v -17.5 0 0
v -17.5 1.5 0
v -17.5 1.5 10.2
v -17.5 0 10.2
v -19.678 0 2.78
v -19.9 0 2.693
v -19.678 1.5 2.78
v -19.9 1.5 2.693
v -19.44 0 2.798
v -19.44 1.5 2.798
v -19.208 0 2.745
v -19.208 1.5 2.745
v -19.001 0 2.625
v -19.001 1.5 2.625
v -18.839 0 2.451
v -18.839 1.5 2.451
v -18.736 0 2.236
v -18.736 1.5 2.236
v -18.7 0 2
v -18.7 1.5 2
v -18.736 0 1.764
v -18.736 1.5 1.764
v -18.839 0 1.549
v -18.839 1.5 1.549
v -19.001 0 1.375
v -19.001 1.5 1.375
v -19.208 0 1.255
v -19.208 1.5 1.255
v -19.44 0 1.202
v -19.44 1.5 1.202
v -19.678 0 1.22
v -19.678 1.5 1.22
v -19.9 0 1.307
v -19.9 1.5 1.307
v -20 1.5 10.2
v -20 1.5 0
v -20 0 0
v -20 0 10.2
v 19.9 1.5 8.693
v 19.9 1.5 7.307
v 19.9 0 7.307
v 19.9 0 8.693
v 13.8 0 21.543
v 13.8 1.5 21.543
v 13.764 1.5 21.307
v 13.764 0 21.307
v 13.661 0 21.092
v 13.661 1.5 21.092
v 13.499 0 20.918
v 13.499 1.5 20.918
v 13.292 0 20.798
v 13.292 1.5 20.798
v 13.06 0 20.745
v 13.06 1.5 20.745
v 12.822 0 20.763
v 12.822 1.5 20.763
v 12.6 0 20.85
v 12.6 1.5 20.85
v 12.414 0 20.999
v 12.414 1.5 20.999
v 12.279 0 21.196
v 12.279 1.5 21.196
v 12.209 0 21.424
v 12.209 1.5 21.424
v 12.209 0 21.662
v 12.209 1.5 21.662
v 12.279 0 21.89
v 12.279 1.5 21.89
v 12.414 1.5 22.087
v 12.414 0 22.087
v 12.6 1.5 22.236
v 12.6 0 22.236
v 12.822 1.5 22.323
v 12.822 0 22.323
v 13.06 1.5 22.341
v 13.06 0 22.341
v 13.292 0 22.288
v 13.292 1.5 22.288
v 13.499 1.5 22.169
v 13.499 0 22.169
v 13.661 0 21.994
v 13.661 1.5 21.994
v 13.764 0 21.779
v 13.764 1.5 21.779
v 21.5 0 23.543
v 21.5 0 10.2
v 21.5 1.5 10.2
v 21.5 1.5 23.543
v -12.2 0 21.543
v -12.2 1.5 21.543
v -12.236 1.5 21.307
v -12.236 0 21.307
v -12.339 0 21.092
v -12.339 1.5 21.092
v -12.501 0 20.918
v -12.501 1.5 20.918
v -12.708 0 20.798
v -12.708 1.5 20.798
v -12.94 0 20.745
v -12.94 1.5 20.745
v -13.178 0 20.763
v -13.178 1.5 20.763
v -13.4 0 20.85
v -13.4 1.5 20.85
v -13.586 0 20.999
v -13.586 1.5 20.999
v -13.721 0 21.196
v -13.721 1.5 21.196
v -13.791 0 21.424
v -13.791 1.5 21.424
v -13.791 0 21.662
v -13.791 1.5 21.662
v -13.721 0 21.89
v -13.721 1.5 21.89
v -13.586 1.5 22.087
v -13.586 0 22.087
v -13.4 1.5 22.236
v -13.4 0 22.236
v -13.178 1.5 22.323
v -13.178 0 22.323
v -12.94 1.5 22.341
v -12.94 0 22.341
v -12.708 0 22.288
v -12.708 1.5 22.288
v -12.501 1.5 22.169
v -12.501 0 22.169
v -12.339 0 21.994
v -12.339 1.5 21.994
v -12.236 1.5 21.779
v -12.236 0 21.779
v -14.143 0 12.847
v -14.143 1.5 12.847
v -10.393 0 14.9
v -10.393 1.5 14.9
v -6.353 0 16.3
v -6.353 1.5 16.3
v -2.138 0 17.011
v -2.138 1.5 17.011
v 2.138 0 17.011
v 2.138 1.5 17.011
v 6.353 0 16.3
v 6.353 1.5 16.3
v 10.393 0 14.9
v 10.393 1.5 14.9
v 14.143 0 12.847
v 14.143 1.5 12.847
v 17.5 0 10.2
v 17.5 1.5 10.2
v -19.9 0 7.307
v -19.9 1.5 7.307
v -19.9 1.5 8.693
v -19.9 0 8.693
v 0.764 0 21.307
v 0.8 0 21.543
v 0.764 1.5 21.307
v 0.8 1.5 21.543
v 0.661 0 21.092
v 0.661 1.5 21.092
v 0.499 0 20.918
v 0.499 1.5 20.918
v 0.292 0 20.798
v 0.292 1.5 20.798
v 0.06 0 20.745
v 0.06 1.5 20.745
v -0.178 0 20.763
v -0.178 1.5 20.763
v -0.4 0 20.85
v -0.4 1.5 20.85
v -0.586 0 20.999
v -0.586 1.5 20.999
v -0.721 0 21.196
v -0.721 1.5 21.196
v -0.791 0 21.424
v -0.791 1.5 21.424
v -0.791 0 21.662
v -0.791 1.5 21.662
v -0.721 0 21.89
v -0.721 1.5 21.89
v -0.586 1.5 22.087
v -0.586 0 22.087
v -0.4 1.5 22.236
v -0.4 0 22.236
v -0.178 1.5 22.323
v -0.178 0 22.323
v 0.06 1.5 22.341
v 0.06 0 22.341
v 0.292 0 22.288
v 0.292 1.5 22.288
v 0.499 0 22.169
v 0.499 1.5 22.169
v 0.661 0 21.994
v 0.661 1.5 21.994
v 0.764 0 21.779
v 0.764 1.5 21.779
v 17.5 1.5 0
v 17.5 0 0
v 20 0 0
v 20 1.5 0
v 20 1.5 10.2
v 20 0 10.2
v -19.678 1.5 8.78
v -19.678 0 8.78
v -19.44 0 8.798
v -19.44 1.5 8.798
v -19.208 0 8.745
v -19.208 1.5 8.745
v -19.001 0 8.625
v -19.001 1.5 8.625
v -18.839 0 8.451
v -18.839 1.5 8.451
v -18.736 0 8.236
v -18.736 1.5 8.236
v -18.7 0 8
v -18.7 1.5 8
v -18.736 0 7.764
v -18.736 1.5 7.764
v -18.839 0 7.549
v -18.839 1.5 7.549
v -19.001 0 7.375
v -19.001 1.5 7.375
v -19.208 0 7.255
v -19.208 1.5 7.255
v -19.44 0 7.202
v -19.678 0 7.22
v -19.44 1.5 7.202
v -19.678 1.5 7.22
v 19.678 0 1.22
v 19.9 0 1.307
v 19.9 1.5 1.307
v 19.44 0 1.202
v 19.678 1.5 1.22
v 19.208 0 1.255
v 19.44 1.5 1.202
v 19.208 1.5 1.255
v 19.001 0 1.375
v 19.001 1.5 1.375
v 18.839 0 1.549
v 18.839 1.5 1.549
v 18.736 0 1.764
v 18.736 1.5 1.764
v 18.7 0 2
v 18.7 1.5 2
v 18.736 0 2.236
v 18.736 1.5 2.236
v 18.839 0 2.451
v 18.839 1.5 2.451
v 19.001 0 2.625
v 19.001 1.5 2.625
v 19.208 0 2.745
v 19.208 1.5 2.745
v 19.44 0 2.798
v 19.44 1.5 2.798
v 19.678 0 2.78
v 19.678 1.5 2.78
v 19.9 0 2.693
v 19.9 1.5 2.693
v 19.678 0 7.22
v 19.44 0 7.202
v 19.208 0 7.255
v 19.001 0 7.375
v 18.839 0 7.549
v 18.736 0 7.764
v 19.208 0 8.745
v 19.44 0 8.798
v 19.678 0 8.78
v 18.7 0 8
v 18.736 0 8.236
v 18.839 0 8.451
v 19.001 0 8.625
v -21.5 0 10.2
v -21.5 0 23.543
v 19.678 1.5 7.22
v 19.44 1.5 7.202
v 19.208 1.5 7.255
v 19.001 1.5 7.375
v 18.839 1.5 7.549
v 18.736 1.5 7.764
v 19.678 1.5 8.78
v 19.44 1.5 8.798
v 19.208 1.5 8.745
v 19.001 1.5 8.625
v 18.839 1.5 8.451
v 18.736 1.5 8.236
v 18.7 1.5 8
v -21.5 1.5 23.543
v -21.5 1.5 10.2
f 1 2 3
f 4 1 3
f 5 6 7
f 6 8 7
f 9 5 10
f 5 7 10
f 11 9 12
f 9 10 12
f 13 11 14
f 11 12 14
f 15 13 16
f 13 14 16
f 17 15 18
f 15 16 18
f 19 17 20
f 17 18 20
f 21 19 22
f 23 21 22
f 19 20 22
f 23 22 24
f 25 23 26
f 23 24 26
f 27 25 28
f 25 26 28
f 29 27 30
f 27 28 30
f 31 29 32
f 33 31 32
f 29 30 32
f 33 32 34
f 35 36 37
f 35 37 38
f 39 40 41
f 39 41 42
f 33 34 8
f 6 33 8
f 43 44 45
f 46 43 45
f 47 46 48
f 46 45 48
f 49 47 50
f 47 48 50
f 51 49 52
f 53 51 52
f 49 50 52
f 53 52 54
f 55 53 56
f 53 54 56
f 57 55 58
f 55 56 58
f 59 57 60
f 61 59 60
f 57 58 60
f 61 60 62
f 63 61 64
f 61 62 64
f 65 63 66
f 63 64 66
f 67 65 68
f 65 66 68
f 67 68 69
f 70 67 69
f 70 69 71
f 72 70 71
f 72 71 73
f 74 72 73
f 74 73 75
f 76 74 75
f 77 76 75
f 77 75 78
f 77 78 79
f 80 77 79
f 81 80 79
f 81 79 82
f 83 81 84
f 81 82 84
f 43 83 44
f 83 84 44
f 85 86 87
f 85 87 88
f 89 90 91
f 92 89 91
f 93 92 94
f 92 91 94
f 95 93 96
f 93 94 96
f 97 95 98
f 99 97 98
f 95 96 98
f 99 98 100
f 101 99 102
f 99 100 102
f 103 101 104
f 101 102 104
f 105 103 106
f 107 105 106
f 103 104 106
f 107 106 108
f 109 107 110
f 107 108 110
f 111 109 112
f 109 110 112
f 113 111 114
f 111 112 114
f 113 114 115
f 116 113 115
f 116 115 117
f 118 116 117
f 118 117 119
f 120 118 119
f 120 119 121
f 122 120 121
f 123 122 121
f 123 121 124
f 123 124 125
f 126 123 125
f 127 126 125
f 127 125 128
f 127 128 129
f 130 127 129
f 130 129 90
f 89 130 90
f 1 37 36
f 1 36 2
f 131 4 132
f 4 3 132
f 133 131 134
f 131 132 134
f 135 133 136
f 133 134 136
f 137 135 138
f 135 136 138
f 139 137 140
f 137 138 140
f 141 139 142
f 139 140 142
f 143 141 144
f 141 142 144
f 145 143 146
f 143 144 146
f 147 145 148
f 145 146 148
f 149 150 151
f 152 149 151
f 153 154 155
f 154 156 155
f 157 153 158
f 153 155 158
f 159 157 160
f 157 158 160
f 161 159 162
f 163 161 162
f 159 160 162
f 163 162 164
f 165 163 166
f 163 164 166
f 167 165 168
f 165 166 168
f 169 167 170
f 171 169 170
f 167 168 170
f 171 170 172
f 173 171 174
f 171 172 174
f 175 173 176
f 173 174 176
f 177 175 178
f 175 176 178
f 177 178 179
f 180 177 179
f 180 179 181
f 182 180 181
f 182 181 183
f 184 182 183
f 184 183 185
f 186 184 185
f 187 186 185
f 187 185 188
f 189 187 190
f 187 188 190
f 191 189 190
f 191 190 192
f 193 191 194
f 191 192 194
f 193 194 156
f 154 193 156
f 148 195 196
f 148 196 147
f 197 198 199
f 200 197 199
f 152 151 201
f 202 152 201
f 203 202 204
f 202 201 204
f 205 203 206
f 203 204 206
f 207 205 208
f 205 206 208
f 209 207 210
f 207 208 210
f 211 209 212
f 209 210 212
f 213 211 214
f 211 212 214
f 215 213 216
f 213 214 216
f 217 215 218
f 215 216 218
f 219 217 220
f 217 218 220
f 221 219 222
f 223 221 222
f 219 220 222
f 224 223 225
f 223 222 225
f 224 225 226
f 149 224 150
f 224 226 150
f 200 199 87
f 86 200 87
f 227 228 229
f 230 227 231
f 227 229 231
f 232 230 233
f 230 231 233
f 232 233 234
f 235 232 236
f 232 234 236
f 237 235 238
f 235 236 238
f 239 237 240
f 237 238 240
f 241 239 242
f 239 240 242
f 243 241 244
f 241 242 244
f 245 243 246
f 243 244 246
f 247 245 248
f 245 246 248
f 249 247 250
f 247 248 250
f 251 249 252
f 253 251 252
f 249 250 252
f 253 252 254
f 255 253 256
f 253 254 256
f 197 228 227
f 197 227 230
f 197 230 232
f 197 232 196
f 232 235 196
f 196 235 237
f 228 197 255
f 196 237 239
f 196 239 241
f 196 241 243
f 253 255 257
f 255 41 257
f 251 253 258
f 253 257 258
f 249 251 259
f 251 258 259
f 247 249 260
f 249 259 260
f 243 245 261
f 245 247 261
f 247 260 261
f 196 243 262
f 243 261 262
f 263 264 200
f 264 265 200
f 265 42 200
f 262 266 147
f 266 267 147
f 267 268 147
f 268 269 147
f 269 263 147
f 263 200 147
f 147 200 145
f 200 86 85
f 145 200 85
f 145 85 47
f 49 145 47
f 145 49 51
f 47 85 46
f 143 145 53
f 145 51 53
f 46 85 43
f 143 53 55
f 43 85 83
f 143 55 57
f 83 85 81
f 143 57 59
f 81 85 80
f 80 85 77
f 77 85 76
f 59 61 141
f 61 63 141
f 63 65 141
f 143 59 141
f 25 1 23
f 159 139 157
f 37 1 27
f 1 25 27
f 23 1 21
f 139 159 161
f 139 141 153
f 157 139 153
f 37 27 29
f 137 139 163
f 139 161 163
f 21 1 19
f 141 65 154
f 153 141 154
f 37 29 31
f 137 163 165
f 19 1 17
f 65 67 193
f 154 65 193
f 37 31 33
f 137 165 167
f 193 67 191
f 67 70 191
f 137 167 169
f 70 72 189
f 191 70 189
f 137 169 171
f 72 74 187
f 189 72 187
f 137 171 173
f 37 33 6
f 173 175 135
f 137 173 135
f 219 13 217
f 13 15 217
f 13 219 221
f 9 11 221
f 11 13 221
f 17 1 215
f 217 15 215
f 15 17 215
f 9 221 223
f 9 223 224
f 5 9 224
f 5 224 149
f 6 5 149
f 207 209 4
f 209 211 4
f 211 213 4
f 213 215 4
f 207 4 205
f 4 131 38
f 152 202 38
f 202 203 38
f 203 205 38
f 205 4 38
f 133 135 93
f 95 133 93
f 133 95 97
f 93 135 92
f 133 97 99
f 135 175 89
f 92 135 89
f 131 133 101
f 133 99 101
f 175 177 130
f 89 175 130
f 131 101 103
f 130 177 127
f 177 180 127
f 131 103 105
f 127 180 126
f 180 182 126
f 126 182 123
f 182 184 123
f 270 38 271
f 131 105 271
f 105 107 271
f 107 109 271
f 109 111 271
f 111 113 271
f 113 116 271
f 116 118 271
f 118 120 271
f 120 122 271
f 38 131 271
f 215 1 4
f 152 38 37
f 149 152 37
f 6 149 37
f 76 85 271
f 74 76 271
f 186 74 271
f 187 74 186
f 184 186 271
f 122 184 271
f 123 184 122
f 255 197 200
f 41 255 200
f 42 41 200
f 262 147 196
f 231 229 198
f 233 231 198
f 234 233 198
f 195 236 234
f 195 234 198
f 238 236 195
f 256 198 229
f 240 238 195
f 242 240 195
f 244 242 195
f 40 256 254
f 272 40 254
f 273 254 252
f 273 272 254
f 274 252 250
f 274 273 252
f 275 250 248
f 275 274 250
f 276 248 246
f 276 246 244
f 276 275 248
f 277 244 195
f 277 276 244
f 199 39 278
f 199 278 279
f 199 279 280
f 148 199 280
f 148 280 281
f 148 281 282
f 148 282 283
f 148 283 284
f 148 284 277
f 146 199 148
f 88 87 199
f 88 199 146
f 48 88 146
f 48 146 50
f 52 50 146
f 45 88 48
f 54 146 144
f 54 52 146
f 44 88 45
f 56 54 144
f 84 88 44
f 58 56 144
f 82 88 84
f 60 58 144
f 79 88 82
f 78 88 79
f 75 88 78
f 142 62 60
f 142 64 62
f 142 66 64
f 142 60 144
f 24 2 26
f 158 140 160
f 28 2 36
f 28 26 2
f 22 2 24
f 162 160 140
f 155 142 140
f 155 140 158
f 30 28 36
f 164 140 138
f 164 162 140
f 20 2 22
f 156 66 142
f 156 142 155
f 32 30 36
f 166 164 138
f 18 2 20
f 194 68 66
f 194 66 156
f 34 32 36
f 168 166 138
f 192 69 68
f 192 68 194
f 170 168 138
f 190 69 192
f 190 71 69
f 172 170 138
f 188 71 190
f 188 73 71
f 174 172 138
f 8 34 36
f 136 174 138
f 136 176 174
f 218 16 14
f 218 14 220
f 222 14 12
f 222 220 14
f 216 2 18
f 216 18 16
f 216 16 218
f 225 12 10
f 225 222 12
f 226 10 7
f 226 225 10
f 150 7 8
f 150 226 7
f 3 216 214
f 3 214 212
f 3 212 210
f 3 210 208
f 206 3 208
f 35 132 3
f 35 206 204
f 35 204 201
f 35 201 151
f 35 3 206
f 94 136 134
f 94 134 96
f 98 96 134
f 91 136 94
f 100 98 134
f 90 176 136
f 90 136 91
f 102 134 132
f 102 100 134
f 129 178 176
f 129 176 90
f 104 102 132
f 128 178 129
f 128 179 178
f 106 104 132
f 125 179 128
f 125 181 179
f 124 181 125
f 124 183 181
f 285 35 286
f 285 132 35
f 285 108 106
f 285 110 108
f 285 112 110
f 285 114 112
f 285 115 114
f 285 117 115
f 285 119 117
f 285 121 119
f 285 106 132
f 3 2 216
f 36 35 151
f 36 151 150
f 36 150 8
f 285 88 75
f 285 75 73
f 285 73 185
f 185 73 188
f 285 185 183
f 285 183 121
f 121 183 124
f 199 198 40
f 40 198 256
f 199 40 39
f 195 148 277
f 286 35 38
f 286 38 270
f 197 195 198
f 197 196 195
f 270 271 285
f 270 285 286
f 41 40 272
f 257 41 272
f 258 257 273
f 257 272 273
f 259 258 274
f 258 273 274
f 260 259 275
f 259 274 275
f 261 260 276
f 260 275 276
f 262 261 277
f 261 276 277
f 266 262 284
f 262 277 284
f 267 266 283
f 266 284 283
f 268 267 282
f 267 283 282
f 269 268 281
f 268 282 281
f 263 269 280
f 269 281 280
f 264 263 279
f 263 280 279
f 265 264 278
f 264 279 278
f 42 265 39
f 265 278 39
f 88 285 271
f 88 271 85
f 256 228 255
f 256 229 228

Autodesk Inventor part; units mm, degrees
ref_plane "YZ Plane" through (0, 0, 0) normal (1, 0, 0) x (0, 1, 0)
ref_plane "XZ Plane" through (0, 0, 0) normal (0, 1, 0) x (-1, 0, 0)
ref_plane "XY Plane" through (0, 0, 0) normal (0, 0, 1) x (1, 0, 0)
sketch "スケッチ7" plane through (0, 1.5, 0) normal (0, 1, 0) x (1, 0, 0)
  line L0 (-20, 0) -> (-19.9, 0)
  line L1 (-19.9, 0) -> (-19.9, -10.2)
  line L2 (-19.9, -10.2) -> (-20, -10.2)
  line L3 (-20, -10.2) -> (-20, 0)
  line L4 (17.5, 0) -> (20, 0)
  line L5 (20, 0) -> (19.9, 0)
  line L6 (19.9, 0) -> (19.9, -10.2)
  line L7 (19.9, -10.2) -> (20, -10.2)
  line L8 (20, -10.2) -> (20, 0)
  line L9 (-20, -10.2) -> (-21.5, -10.2)
  line L10 (-20, 0) -> (-20, -1.3755)
  point P0 (0, 0)
  dimension "d21" = 0.1
  dimension "d22" = 0.1
sketch "スケッチ1" plane through (0, 0, 0) normal (0, 1, 0) x (-1, 0, 0)
  line L0 (21.5, 0) -> (-21.5, 0)
  line L1 (-21.5, 0) -> (-21.5, 25.1)
  line L2 (-21.5, 25.1) -> (21.5, 25.1)
  line L3 (21.5, 25.1) -> (21.5, 0)
  point P0 (0, 0)
  point P1 (0, 0)
  dimension "d0" = 25.1
  dimension "d1" = 43
extrude "プレート1" add sketch "スケッチ1" along normal blind 1.5
sketch "スケッチ3" plane through (0, 1.5, 0) normal (0, 1, 0) x (1, 0, 0)
  line L0 (21.5, 0) -> (-21.5, 0) projected
  line L1 (-20, 0) -> (-20, -17.1)
  line L2 (20, 0) -> (20, -17.1)
  line L3 (-21.5, -25.1) -> (-21.5, 0) projected
  line L4 (21.5, 0) -> (21.5, -25.1) projected
  line L5 (-20, -17.1) -> (20, -17.1)
  line L6 (-20, 0) -> (-17.5, 0)
  line L7 (-17.5, 0) -> (-17.5, -10.2)
  line L8 (-17.5, -10.2) -> (-20, -10.2)
  line L9 (-20, -10.2) -> (-20, 0)
  line L10 (20, 0) -> (17.5, 0)
  line L11 (17.5, 0) -> (17.5, -10.2)
  line L12 (17.5, -10.2) -> (20, -10.2)
  line L13 (20, -10.2) -> (20, 0)
  line L14 (-20, -10.2) -> (-21.5, -10.2)
  line L15 (20, -10.2) -> (21.5, -10.2)
  line L16 (21.5, -25.1) -> (-21.5, -25.1) projected
  arc A0 (-17.5, -10.2) -> (17.5, -10.2) centre (0, 8.542) ccw
  point P0 (0, 0)
  point P1 (20, -10.2)
  point P2 (17.5, 0)
  point P3 (-17.5, 0)
  dimension "d5" = 1.5
  dimension "d6" = 1.5
  dimension "d7" = 2.5
  dimension "d8" = 10.2
  dimension "d9" = 8
extrude "押し出し2" cut sketch "スケッチ3" against normal through all contours L4 L15 L2 L0 | L11 A0 L7 L0 | L1 L14 L3 L0
sketch "スケッチ4" plane through (-21.5, 0, 25.1) normal (-1, 0, 0) x (0, 0, 1)
  line L0 (-0.5569, 2.6) -> (-0.5569, 0)
  line L1 (0, 0) -> (-14.9, 0) projected
  line L2 (-14.9, 1.5) -> (-14.9, 0) projected
  line L3 (-14.9, 0) -> (0, 0) projected
  line L4 (0, 0) -> (0, 1.5) projected
  line L5 (0, 1.5) -> (-14.9, 1.5) projected
  point P0 (-25.1, 0)
  point P1 (0, 0)
  point P2 (-0.5569, 1.5)
extrude "押し出し3" cut sketch "スケッチ4" against normal through all contours L5 L4 L1 L0
sketch "スケッチ5" plane through (0, 1.5, 0) normal (0, 1, 0) x (1, 0, 0)
  circle A0 centre (0, -21.5431) radius 0.8 projected
  circle A1 centre (-13, -21.5431) radius 0.8 projected
  circle A2 centre (13, -21.5431) radius 0.8 projected
  line L0 (-21.5, -24.5431) -> (-21.5, -10.2) projected
  line L1 (-21.5, -23.5431) -> (21.5, -23.5431)
  line L2 (21.5, -24.5431) -> (-21.5, -24.5431) projected
  line L3 (21.5, -10.2) -> (21.5, -24.5431) projected
  point P0 (0, 0)
  dimension "d16" = 1
extrude "切り取り1" cut sketch "スケッチ5" against normal blind 1.5
sketch "スケッチ6" plane through (0, 1.5, 0) normal (0, 1, 0) x (1, 0, 0)
  circle A0 centre (19.5, -2) radius 0.8 projected
  circle A1 centre (19.5, -8) radius 0.8 projected
  line L0 (0, -21.3988) -> (0, 0)
  circle A2 centre (-19.5, -2) radius 0.8
  circle A3 centre (-19.5, -8) radius 0.8
  line L1 (-20, 0) -> (-17.5, 0) projected
  line L2 (-20, 0) -> (-19.9, 0)
  line L3 (-19.9, 0) -> (-19.9, -10.2)
  line L4 (-19.9, -10.2) -> (-20, -10.2)
  line L5 (-20, -10.2) -> (-20, 0)
  line L6 (-20, -10.2) -> (-21.5, -10.2) projected
  line L7 (20, 0) -> (19.9, 0)
  line L8 (19.9, 0) -> (19.9, -10.2)
  line L9 (19.9, -10.2) -> (20, -10.2)
  line L10 (20, -10.2) -> (20, 0)
  line L11 (17.5, 0) -> (20, 0) projected
  line L12 (21.5, -10.2) -> (20, -10.2) projected
  line L13 (20, -10.2) -> (20, 0) projected
  dimension "d19" = 0.1
  dimension "d20" = 0.1
extrude "切り取り2" cut sketch "スケッチ6" against normal blind 1.5 contours A0 L10 | L10 A0 L8 | L8 A0 | L10 A1 L8 | A1 L10 | L8 A1 | A2 L3 | L3 A2 L5 | L5 A2 | L3 A3 L5 | A3 L3 | L5 A3
sheet face with bend "面2" sketch "スケッチ7" thickness 1.5 toward (0, -1, 0) bend radius 1.5
bend "曲げ1"
equation "\"d6\" = d5"
equation "\"d14\" = Thickness"
equation "\"d17\" = Thickness"
equation "\"d2\" = Thickness"
equation "\"d23\" = BendRadius"
equation "\"d24\" = BendReliefWidth"
equation "\"d26\" = MinimumRemnant"
equation "\"d25\" = BendReliefDepth"
equation "\"d27\" = TransitionRadius"
equation "\"BendRadius\" = Thickness"
equation "\"BendReliefWidth\" = Thickness"
equation "\"BendReliefDepth\" = 0.5 * Thickness"
equation "\"CornerReliefSize\" = 4 * Thickness"
equation "\"MinimumRemnant\" = 2 * Thickness"
equation "\"TransitionRadius\" = BendRadius"
equation "\"JacobiRadiusSize\" = BendRadius"
equation "\"GapSize\" = Thickness"
equation "\"Thickness\" = 1.5"
properties part number "chest_cover_base" material "アルミニウム 6061"
